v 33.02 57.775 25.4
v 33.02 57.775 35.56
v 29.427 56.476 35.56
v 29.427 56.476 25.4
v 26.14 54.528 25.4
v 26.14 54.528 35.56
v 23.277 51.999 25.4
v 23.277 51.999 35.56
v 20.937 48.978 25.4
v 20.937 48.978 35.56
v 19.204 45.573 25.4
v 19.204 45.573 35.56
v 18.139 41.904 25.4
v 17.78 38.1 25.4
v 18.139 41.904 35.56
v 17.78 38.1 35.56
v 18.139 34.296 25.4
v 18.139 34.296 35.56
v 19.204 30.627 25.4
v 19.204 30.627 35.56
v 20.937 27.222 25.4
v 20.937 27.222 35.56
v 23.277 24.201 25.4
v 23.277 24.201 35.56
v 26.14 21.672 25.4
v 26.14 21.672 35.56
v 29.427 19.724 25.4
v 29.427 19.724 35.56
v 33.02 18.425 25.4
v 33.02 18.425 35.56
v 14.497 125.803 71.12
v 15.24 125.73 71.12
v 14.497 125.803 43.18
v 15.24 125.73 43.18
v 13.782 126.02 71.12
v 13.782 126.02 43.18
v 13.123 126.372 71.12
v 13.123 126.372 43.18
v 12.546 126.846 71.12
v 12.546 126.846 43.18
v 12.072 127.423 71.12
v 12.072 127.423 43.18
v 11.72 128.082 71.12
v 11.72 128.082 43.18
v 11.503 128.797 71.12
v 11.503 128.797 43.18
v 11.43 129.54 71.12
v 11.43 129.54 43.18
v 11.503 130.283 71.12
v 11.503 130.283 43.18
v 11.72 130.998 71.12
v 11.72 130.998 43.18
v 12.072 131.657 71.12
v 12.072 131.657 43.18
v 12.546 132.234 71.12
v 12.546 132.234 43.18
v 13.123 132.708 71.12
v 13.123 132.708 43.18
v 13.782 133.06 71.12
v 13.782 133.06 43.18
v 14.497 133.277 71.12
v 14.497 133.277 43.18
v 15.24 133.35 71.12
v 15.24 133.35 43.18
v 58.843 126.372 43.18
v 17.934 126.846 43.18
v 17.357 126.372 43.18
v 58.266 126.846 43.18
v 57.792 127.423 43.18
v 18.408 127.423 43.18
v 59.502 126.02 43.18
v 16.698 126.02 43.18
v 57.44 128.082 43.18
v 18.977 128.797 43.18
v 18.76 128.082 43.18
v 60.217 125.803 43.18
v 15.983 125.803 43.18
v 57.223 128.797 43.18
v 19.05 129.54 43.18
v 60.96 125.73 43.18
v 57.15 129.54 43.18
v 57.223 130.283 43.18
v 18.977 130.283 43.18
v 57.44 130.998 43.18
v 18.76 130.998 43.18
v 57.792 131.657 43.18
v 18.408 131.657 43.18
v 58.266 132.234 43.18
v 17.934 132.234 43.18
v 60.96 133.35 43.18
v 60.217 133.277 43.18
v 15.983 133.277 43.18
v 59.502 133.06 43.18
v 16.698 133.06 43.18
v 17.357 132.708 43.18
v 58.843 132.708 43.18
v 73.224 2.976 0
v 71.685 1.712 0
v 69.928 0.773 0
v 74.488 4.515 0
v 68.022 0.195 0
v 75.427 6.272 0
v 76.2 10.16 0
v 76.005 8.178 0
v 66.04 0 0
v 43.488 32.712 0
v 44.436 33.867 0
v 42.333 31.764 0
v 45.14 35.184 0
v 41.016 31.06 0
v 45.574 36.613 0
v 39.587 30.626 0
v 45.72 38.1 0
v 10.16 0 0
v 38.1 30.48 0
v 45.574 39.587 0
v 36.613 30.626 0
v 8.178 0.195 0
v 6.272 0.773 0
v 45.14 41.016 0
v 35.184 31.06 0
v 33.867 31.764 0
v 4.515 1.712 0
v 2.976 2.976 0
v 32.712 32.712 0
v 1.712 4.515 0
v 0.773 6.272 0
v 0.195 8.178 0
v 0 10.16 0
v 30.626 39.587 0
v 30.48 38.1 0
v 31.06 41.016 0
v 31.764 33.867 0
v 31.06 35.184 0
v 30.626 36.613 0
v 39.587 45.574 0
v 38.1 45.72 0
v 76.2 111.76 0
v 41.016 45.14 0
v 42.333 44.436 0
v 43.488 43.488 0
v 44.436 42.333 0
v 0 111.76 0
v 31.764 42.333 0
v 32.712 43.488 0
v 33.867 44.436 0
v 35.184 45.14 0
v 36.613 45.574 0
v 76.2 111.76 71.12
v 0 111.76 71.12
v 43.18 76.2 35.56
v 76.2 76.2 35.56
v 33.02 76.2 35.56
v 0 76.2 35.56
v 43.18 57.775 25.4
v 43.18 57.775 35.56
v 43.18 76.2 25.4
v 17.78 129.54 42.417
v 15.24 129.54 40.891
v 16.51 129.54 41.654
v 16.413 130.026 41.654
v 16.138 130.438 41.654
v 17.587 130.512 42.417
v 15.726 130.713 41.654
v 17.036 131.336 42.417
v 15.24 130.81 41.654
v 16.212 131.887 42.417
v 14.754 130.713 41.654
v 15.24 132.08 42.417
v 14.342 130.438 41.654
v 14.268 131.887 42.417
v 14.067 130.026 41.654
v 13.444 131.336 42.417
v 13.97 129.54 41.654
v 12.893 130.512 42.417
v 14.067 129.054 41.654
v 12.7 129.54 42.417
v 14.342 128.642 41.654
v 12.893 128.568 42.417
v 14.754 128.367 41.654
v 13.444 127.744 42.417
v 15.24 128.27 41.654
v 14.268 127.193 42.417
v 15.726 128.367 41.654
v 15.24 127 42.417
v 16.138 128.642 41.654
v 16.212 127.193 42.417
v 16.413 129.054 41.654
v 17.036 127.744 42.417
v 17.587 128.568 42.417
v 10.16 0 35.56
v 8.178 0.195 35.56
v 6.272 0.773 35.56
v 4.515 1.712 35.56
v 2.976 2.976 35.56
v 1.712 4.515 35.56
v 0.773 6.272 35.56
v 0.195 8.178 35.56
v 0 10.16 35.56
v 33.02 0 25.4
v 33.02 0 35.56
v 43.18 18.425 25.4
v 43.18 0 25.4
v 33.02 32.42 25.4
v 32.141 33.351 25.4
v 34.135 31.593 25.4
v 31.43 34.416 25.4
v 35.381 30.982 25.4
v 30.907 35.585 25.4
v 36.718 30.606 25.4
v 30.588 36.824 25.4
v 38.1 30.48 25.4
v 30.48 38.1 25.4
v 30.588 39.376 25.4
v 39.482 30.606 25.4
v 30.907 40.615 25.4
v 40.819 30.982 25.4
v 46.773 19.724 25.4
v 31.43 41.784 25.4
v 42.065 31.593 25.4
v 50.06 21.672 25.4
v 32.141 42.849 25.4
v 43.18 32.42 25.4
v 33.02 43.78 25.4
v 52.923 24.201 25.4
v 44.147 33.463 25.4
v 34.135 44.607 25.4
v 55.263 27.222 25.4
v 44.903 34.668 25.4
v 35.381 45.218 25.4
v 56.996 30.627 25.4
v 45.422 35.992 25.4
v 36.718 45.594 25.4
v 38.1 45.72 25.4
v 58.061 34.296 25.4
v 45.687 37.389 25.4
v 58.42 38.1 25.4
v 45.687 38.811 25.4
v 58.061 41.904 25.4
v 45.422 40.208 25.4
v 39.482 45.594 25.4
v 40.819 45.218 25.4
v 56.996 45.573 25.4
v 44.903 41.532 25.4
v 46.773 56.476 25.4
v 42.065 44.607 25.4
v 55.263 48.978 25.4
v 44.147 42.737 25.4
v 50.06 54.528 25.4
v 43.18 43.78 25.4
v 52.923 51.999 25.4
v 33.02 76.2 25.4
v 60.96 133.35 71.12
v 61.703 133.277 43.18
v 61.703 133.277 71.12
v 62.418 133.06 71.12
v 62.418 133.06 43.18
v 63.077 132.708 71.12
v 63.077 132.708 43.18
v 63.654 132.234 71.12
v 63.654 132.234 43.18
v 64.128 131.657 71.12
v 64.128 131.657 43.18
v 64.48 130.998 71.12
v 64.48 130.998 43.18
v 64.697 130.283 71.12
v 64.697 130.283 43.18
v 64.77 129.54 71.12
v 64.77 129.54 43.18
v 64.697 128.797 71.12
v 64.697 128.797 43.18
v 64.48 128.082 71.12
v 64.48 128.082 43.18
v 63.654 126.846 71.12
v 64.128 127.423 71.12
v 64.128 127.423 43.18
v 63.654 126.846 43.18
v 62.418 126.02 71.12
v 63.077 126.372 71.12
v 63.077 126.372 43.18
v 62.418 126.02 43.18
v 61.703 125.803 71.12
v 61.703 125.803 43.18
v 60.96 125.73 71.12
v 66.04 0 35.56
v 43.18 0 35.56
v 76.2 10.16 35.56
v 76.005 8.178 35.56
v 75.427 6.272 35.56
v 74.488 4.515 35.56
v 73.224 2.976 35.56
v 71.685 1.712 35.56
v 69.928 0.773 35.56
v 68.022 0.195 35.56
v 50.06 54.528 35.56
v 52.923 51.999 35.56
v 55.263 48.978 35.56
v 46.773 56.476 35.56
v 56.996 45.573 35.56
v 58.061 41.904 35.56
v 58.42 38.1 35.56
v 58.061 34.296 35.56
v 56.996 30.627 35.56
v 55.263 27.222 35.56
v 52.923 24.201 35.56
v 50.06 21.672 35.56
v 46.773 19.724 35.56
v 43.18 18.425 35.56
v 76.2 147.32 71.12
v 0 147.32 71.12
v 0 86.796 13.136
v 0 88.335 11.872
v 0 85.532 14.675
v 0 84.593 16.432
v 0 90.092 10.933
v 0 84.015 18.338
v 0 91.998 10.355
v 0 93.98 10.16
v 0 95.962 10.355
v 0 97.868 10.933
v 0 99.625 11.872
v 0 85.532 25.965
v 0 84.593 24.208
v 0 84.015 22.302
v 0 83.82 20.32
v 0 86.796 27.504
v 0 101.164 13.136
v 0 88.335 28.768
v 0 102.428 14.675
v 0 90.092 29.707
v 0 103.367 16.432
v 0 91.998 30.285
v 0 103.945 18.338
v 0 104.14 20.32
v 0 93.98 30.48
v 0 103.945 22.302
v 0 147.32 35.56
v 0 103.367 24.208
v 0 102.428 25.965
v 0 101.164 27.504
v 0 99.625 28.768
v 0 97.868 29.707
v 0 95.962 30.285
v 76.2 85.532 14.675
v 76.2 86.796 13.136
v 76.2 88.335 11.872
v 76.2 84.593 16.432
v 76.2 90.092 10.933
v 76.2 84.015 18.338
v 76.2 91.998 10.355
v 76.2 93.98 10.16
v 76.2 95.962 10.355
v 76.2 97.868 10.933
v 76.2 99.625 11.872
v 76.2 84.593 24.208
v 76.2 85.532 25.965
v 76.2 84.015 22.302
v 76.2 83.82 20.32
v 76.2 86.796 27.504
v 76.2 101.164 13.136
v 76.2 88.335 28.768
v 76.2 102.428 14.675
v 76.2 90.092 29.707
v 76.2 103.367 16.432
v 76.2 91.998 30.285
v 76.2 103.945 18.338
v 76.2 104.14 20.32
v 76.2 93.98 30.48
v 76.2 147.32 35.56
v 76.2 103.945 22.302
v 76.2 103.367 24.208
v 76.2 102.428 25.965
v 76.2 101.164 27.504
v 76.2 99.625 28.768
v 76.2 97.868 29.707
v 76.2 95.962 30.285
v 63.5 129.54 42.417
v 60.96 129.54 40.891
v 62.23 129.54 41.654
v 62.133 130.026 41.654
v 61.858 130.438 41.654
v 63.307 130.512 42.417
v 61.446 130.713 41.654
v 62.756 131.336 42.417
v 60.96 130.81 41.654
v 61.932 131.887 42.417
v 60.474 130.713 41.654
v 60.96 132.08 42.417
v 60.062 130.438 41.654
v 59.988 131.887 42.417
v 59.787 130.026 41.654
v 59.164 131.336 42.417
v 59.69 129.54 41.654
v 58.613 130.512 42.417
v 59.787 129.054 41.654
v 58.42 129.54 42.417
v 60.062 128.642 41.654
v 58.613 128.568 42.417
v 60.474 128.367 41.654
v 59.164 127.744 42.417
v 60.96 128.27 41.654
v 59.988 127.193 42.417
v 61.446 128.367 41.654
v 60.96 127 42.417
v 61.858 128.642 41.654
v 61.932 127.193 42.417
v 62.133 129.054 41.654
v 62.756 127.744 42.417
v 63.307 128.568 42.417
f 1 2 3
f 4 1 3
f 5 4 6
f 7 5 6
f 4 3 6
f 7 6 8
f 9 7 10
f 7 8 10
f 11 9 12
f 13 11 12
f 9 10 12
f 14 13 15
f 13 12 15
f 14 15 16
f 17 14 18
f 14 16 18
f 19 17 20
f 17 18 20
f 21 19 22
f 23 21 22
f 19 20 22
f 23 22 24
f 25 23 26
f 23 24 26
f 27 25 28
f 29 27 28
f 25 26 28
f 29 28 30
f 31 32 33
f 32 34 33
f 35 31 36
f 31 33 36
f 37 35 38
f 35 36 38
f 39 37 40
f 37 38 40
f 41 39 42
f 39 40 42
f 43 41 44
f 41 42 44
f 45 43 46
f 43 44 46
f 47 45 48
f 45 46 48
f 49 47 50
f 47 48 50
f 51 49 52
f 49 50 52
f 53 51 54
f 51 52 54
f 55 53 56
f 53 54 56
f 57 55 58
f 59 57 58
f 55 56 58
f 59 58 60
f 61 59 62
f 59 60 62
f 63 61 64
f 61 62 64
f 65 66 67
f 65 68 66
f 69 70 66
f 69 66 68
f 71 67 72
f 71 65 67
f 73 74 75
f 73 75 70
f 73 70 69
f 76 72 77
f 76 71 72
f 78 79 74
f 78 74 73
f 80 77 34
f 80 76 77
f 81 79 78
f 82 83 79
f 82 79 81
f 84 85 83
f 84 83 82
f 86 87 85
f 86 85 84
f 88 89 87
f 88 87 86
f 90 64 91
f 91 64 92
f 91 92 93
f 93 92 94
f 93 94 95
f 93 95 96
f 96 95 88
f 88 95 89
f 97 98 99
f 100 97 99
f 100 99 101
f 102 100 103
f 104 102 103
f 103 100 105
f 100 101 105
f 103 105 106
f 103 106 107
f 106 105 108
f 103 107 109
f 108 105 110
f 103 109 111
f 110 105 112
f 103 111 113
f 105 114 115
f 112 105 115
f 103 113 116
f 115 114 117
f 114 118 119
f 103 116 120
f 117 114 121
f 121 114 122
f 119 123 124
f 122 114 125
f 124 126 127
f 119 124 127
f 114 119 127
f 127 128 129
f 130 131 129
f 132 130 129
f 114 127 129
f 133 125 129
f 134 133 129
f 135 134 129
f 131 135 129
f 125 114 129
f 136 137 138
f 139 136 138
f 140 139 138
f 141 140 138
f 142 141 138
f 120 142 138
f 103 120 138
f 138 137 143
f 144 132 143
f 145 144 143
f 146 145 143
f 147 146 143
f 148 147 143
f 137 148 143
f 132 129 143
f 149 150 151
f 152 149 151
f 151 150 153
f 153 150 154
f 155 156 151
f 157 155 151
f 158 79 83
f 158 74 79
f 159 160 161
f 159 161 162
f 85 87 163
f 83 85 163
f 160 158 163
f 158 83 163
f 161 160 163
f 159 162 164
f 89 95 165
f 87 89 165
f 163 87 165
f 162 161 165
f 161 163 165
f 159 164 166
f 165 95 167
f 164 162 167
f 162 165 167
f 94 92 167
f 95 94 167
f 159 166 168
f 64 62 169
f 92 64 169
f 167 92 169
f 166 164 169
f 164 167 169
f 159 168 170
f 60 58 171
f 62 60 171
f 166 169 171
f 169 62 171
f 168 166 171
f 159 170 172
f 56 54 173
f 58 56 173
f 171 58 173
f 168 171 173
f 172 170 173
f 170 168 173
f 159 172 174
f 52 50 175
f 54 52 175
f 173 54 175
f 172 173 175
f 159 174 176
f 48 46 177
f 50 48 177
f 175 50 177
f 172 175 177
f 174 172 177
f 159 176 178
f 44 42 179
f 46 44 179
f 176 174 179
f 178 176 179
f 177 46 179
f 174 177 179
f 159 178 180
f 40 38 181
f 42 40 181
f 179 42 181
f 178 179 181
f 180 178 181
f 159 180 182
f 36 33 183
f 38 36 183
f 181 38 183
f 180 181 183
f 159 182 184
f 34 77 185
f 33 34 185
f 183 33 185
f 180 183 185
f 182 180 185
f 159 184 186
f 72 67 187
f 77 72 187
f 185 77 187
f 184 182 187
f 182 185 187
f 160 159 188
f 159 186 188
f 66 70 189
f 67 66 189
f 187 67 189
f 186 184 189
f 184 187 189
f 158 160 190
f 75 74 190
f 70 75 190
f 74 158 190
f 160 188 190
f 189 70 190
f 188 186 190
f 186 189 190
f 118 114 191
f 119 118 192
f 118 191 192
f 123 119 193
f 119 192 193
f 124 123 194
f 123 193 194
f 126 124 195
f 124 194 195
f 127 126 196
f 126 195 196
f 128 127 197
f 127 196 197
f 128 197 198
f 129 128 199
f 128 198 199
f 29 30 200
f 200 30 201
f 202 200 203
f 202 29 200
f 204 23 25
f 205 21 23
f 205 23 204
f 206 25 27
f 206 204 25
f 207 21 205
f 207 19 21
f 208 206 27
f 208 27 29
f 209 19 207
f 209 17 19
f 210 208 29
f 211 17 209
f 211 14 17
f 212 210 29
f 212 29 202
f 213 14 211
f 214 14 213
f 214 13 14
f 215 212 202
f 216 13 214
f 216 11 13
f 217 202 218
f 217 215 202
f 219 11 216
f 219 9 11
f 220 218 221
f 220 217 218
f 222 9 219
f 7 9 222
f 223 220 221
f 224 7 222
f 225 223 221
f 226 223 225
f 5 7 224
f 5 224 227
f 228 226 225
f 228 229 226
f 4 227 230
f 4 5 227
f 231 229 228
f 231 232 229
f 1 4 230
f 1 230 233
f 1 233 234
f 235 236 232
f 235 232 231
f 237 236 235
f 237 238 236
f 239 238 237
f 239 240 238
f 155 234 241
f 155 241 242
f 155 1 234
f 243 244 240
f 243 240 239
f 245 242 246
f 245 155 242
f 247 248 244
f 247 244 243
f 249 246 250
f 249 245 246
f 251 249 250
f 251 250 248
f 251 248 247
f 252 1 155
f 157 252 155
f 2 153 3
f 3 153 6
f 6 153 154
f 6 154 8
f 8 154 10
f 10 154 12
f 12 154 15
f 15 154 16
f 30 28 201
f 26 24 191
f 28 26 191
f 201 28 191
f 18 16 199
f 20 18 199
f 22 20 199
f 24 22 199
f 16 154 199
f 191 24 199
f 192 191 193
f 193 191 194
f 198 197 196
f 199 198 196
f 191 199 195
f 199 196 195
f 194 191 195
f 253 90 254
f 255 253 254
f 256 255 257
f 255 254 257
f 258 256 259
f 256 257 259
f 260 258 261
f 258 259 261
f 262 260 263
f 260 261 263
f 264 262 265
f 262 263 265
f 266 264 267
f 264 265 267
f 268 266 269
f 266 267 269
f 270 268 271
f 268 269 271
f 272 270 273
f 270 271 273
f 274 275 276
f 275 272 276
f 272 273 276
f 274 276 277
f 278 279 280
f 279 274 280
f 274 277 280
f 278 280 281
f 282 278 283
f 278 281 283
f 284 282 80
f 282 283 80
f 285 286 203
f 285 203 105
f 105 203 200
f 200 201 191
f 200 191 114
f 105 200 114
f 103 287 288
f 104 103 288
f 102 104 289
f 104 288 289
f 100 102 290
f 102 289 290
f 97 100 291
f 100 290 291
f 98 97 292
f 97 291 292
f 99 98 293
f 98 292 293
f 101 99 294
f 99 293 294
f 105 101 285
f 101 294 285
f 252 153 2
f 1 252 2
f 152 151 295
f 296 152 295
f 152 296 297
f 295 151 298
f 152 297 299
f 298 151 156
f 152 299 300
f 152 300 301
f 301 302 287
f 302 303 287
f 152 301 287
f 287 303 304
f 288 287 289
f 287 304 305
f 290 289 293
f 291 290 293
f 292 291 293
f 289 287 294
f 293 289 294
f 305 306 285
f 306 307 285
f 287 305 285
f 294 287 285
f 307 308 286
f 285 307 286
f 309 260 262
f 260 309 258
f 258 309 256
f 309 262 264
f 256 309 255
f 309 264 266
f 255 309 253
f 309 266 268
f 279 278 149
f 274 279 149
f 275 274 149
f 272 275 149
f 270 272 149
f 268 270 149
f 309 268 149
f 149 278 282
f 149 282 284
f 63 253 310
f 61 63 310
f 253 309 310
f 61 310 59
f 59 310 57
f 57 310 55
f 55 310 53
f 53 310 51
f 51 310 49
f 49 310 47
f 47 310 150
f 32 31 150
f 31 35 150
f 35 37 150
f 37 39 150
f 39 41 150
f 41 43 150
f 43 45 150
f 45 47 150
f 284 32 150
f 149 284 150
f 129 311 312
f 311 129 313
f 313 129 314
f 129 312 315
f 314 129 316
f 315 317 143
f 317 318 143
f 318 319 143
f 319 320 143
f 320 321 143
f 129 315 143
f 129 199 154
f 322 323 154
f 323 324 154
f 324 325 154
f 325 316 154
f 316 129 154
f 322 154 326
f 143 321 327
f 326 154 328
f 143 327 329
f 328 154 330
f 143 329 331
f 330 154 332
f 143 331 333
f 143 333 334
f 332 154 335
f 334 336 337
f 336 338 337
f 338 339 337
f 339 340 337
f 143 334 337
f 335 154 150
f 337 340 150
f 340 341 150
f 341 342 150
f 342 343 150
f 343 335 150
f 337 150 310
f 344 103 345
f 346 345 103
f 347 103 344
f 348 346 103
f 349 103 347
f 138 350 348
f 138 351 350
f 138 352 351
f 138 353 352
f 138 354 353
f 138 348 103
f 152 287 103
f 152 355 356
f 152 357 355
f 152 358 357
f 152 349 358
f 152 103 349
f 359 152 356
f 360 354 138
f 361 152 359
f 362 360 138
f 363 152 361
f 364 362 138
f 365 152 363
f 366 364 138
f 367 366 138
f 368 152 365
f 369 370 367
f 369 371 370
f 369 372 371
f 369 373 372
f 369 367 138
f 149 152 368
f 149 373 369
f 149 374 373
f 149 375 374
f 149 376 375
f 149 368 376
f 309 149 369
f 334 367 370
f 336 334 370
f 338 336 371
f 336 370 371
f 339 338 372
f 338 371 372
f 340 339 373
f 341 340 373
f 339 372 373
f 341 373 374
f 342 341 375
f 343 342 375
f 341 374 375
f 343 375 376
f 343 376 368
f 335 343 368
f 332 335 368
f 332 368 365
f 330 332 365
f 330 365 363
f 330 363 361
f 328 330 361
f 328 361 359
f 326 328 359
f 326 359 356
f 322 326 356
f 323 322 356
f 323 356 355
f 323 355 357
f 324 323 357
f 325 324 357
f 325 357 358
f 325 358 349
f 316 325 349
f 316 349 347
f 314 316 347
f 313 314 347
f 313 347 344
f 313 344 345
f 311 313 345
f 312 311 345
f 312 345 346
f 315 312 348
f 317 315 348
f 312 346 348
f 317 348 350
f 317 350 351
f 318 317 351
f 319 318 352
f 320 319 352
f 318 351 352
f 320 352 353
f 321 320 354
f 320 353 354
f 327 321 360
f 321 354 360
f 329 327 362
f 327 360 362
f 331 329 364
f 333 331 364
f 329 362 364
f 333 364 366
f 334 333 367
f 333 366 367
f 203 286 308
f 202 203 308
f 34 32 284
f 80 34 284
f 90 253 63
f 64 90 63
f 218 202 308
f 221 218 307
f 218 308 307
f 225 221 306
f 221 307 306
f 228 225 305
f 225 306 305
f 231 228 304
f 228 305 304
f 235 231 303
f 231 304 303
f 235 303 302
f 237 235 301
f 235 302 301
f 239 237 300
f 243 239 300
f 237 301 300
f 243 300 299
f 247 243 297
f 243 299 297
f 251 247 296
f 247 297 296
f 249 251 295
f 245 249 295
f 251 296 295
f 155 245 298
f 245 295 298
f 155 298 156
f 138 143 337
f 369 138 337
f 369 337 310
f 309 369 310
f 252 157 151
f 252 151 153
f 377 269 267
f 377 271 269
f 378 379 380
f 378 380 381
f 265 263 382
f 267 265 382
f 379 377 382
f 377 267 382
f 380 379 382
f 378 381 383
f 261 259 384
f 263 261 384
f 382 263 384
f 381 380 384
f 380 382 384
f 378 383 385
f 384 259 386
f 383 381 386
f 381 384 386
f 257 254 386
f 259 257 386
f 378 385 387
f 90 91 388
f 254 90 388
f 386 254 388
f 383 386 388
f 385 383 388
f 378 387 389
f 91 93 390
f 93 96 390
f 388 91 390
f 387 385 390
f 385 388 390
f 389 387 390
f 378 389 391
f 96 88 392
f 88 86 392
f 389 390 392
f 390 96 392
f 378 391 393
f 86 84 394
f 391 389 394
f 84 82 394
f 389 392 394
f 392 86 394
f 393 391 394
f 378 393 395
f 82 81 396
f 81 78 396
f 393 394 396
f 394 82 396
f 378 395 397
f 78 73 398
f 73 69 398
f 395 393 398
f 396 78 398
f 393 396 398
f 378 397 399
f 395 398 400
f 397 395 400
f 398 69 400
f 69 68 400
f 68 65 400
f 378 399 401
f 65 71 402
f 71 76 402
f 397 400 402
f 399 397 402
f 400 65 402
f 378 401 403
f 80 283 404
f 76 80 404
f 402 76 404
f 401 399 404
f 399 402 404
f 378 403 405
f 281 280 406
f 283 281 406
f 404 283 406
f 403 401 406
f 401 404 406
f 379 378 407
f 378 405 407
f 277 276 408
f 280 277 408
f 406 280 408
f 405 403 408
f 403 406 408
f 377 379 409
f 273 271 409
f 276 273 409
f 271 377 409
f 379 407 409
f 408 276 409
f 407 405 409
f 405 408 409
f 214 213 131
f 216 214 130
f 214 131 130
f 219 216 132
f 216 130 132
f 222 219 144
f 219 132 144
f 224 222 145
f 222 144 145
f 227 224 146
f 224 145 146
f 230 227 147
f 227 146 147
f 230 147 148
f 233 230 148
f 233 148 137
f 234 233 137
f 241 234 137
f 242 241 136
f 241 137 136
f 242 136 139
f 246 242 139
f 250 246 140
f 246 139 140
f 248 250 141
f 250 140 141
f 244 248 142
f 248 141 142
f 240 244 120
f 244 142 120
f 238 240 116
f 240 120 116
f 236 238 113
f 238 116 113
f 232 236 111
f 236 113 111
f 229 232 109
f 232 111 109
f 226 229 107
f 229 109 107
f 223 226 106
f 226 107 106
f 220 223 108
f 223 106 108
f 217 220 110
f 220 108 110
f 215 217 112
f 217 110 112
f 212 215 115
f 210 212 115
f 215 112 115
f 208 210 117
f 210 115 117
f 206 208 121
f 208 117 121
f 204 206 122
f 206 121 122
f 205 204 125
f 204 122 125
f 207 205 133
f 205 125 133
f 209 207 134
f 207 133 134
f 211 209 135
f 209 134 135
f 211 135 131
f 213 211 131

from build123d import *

# Parameters (mm, degrees)
F1_DEPTH       = 76.2
F3_DEPTH       = 35.561
F7_D           = 7.62
F7_DEPTH       = 27.94
F7_TIP         = 2.2892789585
F8_DEPTH       = 27.94
F9_D           = 15.24
F9_CBORE_D     = 40.64
F9_CBORE_DEPTH = 10.16
F10_DEPTH      = 10.16
F4_R           = 10.16
F11_DEPTH      = 76.201


with BuildPart() as f1:
    # F0 (on Right) → F1 (new body)
    with BuildSketch(Plane.YZ):
        Polygon((0, 35.56), (0, 0), (111.76, 0), (147.32, 35.56), (147.32, 71.12), (111.76, 71.12), (76.2, 35.56), align=None)
    extrude(amount=F1_DEPTH)

    # F2 (on face) → F3 (cut, through all)
    with BuildSketch(Plane.XY.offset(35.56)):
        with BuildLine():
            Line((0, 0), (10.16, 0))
            ThreePointArc((10.16, 0), (2.9757951031, 2.9757951031), (0, 10.16))
            Line((0, 10.16), (0, 0))
        make_face()
        with BuildLine():
            ThreePointArc((76.2, 10.16), (73.2242048969, 2.9757951031), (66.04, 0))
            Line((66.04, 0), (76.2, 0))
            Line((76.2, 0), (76.2, 10.16))
        make_face()
    extrude(amount=-F3_DEPTH, mode=Mode.SUBTRACT)

    # F7
    with Locations(Plane.XY.offset(71.12)):
        with Locations((15.24, 129.54), (60.96, 129.54)):
            Hole(F7_D / 2, depth=F7_DEPTH)
            with Locations((0, 0, -(F7_DEPTH + F7_TIP / 2))):  # 118° drill point
                Cone(0, F7_D / 2, F7_TIP, mode=Mode.SUBTRACT)

    # F5 (on face) → F8 (cut)
    with BuildSketch(Plane.XY.offset(71.12)):
        with BuildLine():
            ThreePointArc((15.24, 133.35), (11.43, 129.54), (15.24, 125.73))
            Line((15.24, 125.73), (60.96, 125.73))
            ThreePointArc((60.96, 125.73), (64.77, 129.54), (60.96, 133.35))
            Line((60.96, 133.35), (15.24, 133.35))
        make_face()
    extrude(amount=-F8_DEPTH, mode=Mode.SUBTRACT)

    # F9 (through all)
    with Locations(Plane.XY.offset(35.56)):
        with Locations((38.1, 38.1)):
            CounterBoreHole(F9_D / 2, F9_CBORE_D / 2, F9_CBORE_DEPTH)

    # F6 (on face) → F10 (cut)
    with BuildSketch(Plane.XY.offset(35.56)):
        with BuildLine():
            Line((43.18, 0), (43.18, 32.4203873372))
            ThreePointArc((43.18, 32.4203873372), (38.1, 30.48), (33.02, 32.4203873372))
            Line((33.02, 32.4203873372), (33.02, 0))
            Line((33.02, 0), (43.18, 0))
        make_face()
        with BuildLine():
            ThreePointArc((33.02, 43.7796126628), (38.1, 45.72), (43.18, 43.7796126628))
            Line((43.18, 43.7796126628), (43.18, 76.2))
            Line((43.18, 76.2), (33.02, 76.2))
            Line((33.02, 76.2), (33.02, 43.7796126628))
        make_face()
    extrude(amount=-F10_DEPTH, mode=Mode.SUBTRACT)

    # F4 (on face) → F11 (cut, through all)
    with BuildSketch(Plane.YZ.offset(76.2)):
        with Locations((93.98, 20.32)):
            Circle(F4_R)
    extrude(amount=-F11_DEPTH, mode=Mode.SUBTRACT)


solid = f1.part
